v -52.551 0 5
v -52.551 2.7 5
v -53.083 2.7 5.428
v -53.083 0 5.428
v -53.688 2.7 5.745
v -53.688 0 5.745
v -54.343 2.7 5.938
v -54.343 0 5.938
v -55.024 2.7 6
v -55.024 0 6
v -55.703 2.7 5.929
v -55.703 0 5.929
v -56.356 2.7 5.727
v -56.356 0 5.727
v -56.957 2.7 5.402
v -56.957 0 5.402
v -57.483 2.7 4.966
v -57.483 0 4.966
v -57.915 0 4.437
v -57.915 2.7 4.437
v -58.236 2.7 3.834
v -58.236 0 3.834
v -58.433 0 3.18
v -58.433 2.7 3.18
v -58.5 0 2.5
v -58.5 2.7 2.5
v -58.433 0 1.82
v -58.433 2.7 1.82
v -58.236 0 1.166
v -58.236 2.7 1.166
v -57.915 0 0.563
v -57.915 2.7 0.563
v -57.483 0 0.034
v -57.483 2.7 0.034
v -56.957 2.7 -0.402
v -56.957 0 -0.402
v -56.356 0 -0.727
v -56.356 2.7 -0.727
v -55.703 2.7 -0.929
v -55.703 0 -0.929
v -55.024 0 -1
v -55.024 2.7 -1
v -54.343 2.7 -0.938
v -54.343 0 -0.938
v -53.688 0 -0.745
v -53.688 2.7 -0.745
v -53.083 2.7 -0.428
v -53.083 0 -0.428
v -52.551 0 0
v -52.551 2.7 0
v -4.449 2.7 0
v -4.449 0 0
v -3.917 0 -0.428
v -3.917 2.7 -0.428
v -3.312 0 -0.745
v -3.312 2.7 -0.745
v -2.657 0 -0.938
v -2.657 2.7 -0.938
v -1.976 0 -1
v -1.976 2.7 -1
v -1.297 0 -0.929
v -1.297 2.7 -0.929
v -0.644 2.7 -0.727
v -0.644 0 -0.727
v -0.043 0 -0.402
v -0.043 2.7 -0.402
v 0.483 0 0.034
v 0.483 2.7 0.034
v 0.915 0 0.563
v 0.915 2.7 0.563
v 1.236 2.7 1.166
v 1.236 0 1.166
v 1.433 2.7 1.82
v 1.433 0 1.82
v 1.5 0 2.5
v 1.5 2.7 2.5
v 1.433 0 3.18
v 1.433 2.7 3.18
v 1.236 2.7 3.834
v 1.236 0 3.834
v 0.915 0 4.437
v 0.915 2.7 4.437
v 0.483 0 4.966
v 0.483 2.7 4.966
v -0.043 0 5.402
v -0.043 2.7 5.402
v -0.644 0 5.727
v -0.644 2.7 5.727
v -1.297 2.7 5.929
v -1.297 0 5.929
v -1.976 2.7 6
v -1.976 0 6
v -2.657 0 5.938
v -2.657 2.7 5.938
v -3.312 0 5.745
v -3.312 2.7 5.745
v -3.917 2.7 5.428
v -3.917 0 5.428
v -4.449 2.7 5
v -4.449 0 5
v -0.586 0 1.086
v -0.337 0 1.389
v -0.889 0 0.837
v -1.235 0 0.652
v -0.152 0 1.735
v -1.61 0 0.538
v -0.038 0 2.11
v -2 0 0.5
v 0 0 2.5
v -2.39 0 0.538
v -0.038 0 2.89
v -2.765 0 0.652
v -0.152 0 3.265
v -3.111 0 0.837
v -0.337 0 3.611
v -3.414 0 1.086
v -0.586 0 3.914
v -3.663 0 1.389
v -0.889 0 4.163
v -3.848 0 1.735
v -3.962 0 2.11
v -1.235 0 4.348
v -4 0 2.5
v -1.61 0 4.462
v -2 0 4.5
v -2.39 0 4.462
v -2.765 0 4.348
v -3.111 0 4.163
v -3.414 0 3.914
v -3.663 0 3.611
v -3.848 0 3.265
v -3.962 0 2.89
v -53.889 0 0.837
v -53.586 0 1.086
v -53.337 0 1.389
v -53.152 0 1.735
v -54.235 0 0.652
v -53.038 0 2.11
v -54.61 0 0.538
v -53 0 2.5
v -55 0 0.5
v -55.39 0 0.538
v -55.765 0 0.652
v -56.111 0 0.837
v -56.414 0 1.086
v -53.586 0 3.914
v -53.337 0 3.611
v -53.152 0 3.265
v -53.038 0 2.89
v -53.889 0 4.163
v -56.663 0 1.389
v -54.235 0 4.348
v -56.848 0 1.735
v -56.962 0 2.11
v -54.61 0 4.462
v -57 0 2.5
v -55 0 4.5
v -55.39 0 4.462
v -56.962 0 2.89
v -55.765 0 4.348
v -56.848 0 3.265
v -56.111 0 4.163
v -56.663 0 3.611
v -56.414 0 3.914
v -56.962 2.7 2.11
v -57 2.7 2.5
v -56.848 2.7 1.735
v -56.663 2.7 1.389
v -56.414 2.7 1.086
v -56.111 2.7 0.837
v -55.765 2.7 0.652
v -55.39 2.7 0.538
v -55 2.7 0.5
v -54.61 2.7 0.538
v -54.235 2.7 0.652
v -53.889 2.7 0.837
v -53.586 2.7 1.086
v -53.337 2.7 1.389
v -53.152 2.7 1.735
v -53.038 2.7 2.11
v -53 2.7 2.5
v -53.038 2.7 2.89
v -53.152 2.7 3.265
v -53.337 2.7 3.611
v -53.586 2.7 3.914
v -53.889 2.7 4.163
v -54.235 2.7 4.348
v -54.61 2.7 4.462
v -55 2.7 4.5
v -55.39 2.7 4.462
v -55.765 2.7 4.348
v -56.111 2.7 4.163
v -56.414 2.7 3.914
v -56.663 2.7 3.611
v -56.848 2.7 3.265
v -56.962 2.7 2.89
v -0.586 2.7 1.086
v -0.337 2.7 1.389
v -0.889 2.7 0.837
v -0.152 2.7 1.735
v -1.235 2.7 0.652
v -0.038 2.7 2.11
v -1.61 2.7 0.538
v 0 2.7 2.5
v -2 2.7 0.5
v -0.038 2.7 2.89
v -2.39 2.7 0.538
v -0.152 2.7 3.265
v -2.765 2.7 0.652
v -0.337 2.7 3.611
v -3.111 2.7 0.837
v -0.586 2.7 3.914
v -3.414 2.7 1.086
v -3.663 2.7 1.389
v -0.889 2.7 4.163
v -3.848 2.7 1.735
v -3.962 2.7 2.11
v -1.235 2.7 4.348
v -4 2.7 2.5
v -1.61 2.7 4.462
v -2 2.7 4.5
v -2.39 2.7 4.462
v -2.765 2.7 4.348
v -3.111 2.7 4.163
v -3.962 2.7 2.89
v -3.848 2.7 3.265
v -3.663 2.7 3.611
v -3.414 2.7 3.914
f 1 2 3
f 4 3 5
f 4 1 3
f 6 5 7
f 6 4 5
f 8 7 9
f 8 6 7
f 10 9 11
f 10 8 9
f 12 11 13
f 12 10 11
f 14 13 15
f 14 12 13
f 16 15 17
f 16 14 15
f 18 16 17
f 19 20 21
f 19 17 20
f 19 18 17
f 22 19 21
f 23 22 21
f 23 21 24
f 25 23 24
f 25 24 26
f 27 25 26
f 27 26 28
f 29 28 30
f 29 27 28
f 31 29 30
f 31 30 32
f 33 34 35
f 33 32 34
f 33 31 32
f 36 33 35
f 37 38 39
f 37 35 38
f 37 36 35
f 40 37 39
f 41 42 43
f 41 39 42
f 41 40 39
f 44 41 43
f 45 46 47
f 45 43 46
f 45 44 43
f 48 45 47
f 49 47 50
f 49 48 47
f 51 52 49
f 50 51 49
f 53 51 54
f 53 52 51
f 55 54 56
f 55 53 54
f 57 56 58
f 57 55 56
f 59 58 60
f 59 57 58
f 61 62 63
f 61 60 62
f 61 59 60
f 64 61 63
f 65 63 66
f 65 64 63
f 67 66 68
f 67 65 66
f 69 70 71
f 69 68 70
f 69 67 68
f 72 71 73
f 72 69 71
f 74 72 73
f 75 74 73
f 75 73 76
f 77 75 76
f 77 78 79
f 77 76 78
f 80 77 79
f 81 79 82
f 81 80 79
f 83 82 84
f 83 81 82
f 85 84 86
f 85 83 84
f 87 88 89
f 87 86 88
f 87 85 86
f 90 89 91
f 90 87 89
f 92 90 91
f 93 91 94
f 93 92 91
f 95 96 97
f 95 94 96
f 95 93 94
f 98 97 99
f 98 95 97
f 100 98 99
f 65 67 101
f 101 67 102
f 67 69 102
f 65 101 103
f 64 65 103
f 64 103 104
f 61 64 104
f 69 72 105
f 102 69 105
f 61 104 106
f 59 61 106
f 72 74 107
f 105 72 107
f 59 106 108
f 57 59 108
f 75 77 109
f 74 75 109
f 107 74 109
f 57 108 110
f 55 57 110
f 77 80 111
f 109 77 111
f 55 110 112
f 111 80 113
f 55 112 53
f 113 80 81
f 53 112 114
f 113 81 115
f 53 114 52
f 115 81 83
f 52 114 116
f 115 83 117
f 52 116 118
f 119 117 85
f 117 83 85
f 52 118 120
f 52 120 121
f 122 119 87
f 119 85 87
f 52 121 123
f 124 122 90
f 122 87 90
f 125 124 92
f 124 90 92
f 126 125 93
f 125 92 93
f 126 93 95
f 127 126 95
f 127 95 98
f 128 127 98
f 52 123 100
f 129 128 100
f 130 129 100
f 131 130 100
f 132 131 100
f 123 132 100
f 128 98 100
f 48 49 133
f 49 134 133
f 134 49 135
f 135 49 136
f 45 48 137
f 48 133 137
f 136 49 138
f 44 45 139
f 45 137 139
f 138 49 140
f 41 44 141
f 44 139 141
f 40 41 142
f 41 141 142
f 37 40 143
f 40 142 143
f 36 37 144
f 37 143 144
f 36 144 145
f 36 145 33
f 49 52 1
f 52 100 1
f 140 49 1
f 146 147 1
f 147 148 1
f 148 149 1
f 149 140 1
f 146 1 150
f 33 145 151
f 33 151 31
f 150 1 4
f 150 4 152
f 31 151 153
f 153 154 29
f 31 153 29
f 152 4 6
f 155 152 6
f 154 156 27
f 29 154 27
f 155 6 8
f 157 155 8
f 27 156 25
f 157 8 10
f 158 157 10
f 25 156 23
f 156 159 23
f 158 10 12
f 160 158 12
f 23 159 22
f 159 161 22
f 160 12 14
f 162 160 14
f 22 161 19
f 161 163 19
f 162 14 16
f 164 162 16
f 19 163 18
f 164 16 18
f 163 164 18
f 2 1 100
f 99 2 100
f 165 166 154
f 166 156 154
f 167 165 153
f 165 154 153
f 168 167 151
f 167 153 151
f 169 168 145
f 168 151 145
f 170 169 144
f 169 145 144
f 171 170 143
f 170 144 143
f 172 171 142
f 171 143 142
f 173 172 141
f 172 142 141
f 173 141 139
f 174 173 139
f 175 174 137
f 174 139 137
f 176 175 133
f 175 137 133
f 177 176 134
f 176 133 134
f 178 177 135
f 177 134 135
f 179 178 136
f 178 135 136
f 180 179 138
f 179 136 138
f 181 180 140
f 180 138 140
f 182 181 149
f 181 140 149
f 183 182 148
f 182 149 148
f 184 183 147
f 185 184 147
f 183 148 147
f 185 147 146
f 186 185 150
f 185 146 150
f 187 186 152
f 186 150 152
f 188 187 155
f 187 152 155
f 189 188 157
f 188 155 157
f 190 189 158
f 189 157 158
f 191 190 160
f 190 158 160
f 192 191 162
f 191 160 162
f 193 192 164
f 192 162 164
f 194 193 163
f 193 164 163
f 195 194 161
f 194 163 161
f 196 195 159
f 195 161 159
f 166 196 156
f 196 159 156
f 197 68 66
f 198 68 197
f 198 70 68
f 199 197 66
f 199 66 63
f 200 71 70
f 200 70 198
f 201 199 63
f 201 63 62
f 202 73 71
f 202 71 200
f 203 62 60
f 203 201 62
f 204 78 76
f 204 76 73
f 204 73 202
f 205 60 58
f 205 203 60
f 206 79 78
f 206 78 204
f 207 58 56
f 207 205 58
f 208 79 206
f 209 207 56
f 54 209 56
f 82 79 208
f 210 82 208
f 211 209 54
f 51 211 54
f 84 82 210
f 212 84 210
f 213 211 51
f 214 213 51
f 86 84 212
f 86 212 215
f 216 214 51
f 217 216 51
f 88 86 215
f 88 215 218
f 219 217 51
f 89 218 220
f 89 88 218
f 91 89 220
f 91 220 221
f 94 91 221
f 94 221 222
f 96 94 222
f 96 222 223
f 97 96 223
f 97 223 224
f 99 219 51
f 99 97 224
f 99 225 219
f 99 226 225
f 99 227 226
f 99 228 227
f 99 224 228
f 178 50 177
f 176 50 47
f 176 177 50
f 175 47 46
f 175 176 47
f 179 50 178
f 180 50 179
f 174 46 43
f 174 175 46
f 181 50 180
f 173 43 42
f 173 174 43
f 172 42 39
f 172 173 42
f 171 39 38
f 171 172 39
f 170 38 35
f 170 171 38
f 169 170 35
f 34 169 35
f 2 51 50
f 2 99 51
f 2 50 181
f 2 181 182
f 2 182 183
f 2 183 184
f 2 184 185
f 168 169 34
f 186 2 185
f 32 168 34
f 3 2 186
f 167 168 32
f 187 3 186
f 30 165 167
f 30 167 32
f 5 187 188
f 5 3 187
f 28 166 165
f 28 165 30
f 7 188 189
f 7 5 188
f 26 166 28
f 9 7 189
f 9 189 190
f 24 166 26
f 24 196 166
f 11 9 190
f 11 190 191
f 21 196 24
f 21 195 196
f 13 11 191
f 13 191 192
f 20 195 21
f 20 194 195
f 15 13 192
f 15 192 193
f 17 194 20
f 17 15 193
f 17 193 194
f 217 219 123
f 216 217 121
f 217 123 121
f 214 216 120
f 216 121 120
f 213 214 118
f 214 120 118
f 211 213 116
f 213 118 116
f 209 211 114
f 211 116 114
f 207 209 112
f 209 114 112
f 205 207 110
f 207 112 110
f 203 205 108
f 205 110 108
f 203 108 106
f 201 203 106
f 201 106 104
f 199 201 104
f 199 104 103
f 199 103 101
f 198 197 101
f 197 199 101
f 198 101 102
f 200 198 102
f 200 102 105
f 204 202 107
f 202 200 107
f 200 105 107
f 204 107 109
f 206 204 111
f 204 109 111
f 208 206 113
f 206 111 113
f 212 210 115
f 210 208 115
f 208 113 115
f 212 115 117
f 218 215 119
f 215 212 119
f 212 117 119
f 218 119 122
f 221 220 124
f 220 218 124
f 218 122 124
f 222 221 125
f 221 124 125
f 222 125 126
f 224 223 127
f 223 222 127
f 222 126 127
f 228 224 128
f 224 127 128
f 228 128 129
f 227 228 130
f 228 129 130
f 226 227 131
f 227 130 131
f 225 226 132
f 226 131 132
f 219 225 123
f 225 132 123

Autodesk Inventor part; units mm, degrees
ref_plane "YZ Plane" through (0, 0, 0) normal (1, 0, 0) x (0, 1, 0)
ref_plane "XZ Plane" through (0, 0, 0) normal (0, 1, 0) x (-1, 0, 0)
ref_plane "XY Plane" through (0, 0, 0) normal (0, 0, 1) x (1, 0, 0)
sketch "Sketch1" plane through (0, 0, 0) normal (0, 1, 0) x (-1, 0, 0)
  line L0 (0, 0) -> (57, 0)
  line L1 (57, 0) -> (57, 5)
  line L2 (57, 5) -> (0, 5)
  line L3 (0, 5) -> (0, 0)
  circle A0 centre (55, 2.5) radius 2
  circle A1 centre (2, 2.5) radius 2
  circle A2 centre (55, 2.5) radius 3.5
  circle A3 centre (2, 2.5) radius 3.5
  line L4 (57, 0) -> (57, 5)
  line L5 (57, 2.5) -> (0, 2.5)
  point P0 (52.5505, 0)
  point P1 (52.5505, 5)
  point P2 (4.4495, 5)
  point P3 (4.4495, 0)
  dimension "d0" = 5
  dimension "d1" = 57
  dimension "d2" = 4
  dimension "d3" = 4
  dimension "d4" = 7
  dimension "d5" = 7
extrude "Extrusion1" add sketch "Sketch1" along normal blind 2.7 contours L3 A1 L5 A3 L0 | L0 A3 L2 L3 | A3 L5 A2 L0 | L3 L2 A3 L5 A1 | A2 L5 A0 L1 L0 | L0 L1 L2 A2 | L2 A2 L5 A3 | A2 L2 L1 A0 L5
properties part number "FP V2 Batang Penggerak" material "Aluminum 6061"
